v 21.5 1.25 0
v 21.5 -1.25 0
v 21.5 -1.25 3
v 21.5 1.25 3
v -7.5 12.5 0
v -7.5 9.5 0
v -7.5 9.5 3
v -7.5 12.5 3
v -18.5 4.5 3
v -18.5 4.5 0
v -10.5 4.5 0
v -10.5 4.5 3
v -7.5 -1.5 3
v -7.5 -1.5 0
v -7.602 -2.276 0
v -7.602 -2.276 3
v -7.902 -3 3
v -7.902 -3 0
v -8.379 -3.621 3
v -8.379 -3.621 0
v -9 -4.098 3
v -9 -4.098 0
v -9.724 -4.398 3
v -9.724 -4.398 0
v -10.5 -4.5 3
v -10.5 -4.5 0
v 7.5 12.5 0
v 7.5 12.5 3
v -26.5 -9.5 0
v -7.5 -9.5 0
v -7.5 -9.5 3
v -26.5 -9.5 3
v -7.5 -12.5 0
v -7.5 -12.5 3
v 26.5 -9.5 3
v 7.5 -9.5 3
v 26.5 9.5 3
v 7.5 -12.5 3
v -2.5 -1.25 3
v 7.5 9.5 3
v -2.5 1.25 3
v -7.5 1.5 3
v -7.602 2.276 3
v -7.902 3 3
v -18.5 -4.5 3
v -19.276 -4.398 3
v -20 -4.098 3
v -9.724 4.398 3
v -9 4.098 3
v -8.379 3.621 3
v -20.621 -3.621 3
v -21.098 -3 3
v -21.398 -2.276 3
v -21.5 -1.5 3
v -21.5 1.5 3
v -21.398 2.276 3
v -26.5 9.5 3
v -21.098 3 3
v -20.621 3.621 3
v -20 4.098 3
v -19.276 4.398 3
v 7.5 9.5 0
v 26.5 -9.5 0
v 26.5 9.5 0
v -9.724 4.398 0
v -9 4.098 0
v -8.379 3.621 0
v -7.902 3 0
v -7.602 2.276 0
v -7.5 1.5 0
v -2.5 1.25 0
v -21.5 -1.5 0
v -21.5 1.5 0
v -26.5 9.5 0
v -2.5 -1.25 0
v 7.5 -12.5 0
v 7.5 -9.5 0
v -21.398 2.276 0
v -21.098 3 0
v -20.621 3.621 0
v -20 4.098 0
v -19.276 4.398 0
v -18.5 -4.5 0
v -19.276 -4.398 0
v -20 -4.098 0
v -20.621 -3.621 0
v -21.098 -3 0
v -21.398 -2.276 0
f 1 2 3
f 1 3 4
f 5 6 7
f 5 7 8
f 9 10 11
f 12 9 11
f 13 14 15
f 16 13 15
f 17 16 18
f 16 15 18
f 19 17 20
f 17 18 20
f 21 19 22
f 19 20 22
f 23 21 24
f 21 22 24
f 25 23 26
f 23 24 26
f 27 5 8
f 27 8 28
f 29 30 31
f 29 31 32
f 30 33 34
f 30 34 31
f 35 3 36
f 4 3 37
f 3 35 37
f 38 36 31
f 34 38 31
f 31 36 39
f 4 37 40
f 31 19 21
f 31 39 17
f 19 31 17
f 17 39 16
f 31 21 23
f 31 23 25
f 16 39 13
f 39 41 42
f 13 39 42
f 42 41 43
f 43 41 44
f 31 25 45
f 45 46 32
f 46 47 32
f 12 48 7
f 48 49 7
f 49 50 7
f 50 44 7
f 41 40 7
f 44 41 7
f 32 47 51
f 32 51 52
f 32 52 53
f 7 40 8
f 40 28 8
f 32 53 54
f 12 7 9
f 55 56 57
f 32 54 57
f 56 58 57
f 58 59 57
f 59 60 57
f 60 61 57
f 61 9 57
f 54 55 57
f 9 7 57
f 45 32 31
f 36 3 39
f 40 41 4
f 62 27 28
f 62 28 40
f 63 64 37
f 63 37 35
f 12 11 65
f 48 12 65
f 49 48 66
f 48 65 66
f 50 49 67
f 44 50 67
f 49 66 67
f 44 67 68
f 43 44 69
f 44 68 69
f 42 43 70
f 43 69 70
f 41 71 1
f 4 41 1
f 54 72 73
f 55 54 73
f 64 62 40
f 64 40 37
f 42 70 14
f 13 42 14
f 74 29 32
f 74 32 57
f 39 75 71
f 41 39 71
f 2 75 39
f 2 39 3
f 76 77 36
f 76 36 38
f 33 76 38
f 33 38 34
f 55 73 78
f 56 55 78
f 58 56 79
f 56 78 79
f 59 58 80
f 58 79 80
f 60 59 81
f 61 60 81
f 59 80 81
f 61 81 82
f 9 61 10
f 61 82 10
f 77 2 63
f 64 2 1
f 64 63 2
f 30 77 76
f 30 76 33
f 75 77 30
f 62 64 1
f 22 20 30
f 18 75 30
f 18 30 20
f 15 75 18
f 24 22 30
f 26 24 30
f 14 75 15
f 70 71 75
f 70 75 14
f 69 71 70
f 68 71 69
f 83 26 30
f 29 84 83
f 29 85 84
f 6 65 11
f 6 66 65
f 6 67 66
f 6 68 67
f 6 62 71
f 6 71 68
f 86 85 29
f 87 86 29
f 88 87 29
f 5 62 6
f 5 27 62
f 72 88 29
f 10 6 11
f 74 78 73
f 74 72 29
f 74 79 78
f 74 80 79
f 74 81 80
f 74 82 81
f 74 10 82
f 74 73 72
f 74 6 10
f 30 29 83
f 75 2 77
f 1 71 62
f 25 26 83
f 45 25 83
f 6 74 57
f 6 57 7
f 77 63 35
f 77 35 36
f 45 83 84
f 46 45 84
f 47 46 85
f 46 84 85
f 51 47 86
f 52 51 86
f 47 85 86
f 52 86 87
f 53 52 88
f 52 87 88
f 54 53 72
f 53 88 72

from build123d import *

# Parameters (mm, degrees)
SKETCH1_W           = 24
SKETCH1_H           = 2.5
BOSS_EXTRUDE1_DEPTH = 3


with BuildPart() as part:
    # Sketch1 → Boss-Extrude1 (new body)
    with BuildSketch(Plane.XY):
        Polygon((-26.5, -9.5), (-26.5, 9.5), (-7.5, 9.5), (-7.5, 12.5), (7.5, 12.5), (7.5, 9.5), (26.5, 9.5), (26.5, -9.5), (7.5, -9.5), (7.5, -12.5), (-7.5, -12.5), (-7.5, -9.5), align=None)
        with Locations((9.5, 0)):
            Rectangle(SKETCH1_W, SKETCH1_H, mode=Mode.SUBTRACT)
        with BuildLine():
            Line((-18.5, 4.5), (-10.5, 4.5))
            ThreePointArc((-10.5, 4.5), (-8.378679656, 3.621320344), (-7.5, 1.5))
            Line((-7.5, 1.5), (-7.5, -1.5))
            ThreePointArc((-7.5, -1.5), (-8.378679656, -3.621320344), (-10.5, -4.5))
            Line((-10.5, -4.5), (-18.5, -4.5))
            ThreePointArc((-18.5, -4.5), (-20.621320344, -3.621320344), (-21.5, -1.5))
            Line((-21.5, -1.5), (-21.5, 1.5))
            ThreePointArc((-21.5, 1.5), (-20.621320344, 3.621320344), (-18.5, 4.5))
        make_face(mode=Mode.SUBTRACT)
    extrude(amount=BOSS_EXTRUDE1_DEPTH)


solid = part.part
